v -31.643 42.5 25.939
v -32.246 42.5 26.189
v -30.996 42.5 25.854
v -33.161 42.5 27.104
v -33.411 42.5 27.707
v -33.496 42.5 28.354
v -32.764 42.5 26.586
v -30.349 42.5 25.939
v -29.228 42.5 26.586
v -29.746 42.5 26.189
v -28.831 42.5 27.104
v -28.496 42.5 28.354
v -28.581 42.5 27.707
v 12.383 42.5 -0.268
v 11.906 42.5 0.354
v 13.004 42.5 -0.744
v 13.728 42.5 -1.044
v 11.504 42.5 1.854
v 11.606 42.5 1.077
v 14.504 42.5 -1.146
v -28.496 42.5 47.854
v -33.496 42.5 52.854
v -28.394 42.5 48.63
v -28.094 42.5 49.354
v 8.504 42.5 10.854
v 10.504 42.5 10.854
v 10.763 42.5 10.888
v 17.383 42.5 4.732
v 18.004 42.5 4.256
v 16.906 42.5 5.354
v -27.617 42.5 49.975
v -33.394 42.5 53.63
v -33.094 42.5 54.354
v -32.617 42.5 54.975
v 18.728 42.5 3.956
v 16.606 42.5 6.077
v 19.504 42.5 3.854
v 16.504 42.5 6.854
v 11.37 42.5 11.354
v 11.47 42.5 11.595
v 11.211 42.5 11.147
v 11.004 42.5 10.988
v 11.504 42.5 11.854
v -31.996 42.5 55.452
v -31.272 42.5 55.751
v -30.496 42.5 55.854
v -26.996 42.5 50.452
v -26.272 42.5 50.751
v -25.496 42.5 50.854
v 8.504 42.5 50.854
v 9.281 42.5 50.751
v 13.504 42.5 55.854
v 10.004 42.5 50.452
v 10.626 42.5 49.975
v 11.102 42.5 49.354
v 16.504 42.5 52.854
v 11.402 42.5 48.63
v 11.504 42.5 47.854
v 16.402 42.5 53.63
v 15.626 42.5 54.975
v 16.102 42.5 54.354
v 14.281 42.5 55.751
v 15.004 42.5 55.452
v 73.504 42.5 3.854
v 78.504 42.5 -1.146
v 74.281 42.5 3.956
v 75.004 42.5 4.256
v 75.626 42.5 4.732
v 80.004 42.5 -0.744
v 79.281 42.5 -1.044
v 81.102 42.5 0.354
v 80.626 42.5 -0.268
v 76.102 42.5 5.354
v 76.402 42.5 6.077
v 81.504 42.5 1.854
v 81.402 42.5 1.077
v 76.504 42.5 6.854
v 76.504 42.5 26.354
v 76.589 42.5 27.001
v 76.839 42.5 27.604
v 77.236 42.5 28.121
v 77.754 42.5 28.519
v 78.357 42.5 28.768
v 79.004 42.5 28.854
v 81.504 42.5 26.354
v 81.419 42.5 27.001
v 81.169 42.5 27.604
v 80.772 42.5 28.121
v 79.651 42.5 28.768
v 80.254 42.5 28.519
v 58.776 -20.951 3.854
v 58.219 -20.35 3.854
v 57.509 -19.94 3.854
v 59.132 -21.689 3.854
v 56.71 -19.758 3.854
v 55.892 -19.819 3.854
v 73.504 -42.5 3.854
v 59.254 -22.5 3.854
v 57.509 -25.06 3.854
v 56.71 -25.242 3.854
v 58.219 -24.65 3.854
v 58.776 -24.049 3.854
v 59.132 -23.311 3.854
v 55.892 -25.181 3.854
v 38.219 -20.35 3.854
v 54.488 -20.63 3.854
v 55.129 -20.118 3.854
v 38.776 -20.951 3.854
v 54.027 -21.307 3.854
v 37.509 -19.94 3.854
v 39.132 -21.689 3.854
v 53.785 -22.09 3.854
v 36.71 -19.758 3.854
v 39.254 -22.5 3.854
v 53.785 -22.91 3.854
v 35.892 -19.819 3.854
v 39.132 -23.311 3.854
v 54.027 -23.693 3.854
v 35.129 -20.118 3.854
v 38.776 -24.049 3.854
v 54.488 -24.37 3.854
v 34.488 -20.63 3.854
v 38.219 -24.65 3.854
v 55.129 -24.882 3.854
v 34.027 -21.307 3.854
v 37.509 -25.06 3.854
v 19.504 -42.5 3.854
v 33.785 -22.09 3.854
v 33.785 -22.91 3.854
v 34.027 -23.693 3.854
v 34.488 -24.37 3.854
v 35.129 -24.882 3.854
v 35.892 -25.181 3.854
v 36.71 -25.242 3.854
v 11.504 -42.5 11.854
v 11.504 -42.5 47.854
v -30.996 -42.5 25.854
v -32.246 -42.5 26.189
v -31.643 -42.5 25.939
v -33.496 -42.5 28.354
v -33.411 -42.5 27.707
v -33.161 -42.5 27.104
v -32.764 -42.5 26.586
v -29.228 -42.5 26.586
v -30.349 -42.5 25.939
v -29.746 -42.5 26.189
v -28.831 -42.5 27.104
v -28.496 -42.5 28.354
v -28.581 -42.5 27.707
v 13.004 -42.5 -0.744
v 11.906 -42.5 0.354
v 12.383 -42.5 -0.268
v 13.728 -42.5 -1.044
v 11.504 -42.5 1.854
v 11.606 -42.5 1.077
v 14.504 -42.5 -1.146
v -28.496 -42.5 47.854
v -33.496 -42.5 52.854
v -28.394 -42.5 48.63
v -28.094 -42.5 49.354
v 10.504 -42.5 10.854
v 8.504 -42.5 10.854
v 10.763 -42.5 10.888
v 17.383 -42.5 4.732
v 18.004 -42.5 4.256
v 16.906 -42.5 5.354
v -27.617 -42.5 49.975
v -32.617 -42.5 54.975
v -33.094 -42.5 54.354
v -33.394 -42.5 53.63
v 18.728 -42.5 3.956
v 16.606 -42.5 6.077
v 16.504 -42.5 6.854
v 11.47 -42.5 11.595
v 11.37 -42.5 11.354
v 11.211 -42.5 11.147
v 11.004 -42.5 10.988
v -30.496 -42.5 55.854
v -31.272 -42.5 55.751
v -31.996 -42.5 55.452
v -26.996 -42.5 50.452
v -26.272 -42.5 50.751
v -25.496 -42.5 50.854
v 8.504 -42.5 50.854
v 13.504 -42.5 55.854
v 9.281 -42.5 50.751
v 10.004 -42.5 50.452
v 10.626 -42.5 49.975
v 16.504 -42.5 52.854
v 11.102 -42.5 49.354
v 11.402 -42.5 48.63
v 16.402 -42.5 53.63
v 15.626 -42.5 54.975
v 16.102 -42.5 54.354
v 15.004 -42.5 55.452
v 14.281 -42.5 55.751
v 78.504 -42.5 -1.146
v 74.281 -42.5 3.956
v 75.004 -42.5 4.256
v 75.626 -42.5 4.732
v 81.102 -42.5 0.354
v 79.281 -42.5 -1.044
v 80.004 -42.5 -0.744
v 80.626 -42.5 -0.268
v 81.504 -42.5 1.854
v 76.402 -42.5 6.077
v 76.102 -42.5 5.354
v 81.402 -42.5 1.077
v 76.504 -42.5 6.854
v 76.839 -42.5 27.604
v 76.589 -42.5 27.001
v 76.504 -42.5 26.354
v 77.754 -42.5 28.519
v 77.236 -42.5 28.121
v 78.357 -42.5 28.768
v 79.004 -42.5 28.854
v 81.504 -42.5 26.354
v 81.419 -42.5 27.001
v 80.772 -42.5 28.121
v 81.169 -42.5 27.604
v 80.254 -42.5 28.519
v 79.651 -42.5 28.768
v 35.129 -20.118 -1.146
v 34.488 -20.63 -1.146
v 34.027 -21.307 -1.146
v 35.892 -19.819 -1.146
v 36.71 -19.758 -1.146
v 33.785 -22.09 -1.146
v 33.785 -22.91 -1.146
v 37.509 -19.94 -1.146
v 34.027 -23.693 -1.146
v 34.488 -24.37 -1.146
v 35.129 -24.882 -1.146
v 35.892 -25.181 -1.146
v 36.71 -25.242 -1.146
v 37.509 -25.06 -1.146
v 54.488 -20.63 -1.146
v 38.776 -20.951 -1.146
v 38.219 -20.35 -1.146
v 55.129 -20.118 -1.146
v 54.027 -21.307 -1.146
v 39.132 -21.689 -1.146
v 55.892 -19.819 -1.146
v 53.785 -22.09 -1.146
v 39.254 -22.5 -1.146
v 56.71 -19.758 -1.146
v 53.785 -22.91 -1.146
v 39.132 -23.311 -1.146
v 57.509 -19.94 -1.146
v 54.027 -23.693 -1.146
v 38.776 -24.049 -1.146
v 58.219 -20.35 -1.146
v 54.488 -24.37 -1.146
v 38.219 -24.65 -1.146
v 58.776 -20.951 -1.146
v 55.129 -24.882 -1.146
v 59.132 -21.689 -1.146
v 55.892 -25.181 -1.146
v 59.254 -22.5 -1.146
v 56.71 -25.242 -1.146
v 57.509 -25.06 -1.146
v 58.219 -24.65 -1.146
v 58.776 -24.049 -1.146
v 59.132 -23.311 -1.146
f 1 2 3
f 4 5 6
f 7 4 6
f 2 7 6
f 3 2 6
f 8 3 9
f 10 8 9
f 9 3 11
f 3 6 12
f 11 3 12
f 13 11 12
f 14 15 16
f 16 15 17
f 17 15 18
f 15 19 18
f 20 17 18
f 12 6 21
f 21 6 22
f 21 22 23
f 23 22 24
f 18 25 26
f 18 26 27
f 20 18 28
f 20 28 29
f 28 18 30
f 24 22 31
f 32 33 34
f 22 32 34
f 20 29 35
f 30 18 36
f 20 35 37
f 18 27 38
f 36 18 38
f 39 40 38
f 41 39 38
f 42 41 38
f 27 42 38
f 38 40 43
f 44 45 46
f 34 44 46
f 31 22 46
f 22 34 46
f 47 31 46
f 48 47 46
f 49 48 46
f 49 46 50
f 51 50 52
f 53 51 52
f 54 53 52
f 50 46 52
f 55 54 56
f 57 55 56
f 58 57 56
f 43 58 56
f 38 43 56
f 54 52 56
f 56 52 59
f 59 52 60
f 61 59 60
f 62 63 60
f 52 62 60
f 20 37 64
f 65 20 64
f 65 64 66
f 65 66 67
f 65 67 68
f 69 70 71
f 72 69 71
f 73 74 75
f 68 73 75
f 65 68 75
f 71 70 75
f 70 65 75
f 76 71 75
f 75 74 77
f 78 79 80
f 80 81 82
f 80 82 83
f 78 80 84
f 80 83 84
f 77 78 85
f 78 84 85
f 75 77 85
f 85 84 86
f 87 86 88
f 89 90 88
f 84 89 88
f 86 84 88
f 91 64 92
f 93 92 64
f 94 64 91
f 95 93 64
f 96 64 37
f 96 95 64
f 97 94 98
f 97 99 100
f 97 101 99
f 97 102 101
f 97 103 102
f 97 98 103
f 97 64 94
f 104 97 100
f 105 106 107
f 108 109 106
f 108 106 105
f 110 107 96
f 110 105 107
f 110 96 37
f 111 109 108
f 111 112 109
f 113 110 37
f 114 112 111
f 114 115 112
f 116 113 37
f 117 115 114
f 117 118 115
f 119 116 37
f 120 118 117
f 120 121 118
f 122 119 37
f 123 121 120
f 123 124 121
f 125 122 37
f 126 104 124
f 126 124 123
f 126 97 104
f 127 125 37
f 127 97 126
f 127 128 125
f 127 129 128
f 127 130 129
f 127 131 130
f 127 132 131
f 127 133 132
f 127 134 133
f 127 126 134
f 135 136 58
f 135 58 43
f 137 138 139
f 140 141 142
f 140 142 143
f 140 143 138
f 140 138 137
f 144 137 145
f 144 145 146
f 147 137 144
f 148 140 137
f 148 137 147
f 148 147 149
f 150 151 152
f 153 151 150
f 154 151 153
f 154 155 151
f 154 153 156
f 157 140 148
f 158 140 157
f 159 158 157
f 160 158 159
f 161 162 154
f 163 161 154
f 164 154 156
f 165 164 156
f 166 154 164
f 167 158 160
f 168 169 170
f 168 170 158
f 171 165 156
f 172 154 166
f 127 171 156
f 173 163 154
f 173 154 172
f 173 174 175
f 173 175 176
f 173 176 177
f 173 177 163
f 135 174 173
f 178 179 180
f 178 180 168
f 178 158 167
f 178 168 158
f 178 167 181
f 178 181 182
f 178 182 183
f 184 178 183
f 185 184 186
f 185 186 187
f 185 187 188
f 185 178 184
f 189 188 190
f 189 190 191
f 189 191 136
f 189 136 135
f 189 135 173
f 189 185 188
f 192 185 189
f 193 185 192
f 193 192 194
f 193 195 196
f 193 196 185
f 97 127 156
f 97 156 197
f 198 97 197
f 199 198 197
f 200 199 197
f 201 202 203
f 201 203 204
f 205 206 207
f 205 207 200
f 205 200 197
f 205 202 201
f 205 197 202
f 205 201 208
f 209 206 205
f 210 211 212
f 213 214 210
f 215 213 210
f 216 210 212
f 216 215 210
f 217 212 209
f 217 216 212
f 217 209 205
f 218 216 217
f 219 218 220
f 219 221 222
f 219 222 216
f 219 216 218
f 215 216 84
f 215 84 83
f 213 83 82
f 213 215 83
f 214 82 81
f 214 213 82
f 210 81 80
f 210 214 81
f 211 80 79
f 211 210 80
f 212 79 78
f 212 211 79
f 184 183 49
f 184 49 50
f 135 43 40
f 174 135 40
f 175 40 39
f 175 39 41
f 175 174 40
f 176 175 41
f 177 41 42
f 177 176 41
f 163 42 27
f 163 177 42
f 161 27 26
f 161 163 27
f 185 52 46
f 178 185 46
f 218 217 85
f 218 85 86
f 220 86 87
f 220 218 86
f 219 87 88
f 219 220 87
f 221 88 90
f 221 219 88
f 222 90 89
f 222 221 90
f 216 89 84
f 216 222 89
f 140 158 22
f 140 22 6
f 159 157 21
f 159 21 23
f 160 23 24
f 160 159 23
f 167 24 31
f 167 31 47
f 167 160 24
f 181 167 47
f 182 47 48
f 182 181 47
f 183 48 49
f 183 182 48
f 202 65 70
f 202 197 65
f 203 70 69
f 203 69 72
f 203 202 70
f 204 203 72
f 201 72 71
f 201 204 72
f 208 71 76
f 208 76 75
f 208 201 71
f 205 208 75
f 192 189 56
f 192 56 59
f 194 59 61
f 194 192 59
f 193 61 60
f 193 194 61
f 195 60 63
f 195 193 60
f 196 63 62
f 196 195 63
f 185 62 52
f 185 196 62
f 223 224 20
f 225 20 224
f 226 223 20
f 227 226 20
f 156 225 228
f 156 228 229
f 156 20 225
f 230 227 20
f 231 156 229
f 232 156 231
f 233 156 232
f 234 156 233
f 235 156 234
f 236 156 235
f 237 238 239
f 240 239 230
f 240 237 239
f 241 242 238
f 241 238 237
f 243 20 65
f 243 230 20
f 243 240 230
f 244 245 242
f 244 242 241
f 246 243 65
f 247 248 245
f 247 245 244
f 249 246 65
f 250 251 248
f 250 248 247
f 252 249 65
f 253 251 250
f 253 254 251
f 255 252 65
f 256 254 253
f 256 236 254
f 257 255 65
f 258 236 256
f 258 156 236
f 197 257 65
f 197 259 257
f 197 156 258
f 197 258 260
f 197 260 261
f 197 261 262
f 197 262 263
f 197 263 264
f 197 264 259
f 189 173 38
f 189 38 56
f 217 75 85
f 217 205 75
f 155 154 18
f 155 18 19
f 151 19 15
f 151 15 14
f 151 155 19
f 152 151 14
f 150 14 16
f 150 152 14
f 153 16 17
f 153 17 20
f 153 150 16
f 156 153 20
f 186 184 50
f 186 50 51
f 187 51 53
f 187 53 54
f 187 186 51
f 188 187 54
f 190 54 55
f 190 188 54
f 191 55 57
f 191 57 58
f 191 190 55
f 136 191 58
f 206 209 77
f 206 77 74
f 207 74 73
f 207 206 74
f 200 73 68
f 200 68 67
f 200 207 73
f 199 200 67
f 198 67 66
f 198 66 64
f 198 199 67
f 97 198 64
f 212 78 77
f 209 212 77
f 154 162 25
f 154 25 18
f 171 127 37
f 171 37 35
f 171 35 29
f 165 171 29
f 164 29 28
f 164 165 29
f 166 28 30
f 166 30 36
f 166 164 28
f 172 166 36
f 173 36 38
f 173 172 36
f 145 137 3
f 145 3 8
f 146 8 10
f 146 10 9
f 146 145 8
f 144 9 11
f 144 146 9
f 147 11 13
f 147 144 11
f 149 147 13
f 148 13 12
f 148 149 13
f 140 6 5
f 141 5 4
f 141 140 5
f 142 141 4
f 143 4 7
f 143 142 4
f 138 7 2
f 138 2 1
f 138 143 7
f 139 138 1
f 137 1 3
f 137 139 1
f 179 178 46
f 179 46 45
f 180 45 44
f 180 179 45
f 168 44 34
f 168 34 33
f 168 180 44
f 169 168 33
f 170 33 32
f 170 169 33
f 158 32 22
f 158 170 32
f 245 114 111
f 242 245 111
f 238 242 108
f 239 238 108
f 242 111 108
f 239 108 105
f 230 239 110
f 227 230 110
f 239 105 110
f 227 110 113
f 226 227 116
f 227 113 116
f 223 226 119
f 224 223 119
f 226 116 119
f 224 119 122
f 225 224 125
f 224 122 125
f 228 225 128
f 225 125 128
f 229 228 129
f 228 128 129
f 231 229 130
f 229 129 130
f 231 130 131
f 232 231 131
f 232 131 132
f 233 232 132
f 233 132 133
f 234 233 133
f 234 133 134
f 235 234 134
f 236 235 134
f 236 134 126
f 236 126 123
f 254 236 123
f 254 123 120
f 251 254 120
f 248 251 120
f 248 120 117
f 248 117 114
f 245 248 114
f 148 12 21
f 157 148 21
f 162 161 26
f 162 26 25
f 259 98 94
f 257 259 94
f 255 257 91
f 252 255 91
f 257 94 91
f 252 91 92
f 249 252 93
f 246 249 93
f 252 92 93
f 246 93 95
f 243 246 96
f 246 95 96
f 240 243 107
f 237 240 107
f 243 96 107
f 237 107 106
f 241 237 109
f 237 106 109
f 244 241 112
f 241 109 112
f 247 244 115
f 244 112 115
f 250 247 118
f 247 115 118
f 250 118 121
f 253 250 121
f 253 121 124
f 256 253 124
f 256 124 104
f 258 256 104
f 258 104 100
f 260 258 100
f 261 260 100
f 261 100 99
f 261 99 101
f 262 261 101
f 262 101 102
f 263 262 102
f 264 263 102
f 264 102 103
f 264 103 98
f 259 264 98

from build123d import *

# Parameters (mm, degrees)
F1_DEPTH = 42.5
F2_R     = 2.75
F3_DEPTH = 5.001


with BuildPart() as f1:
    # F0 (on Front) → F1 (new body, symmetric)
    with BuildSketch(Plane.XZ):
        with BuildLine():
            Line((81.504221, 1.853635), (81.504221, 26.353635))
            ThreePointArc((81.504221, 26.353635), (80.771988, 28.121402), (79.004221, 28.853635))
            ThreePointArc((79.004221, 28.853635), (77.236454, 28.121402), (76.504221, 26.353635))
            Line((76.504221, 26.353635), (76.504221, 6.853635))
            ThreePointArc((76.504221, 6.853635), (75.625541, 4.732315), (73.504221, 3.853635))
            Line((73.504221, 3.853635), (19.504221, 3.853635))
            ThreePointArc((19.504221, 3.853635), (17.382901, 4.732315), (16.504221, 6.853635))
            Line((16.504221, 6.853635), (16.504221, 52.853635))
            ThreePointArc((16.504221, 52.853635), (15.625541, 54.974956), (13.504221, 55.853635))
            Line((13.504221, 55.853635), (-30.495779, 55.853635))
            ThreePointArc((-30.495779, 55.853635), (-32.617099, 54.974956), (-33.495779, 52.853635))
            Line((-33.495779, 52.853635), (-33.495779, 28.353635))
            ThreePointArc((-33.495779, 28.353635), (-32.763546, 26.585868), (-30.995779, 25.853635))
            ThreePointArc((-30.995779, 25.853635), (-29.228012, 26.585868), (-28.495779, 28.353635))
            Line((-28.495779, 28.353635), (-28.495779, 47.853635))
            ThreePointArc((-28.495779, 47.853635), (-27.617099, 49.974956), (-25.495779, 50.853635))
            Line((-25.495779, 50.853635), (8.504221, 50.853635))
            ThreePointArc((8.504221, 50.853635), (10.625541, 49.974956), (11.504221, 47.853635))
            Line((11.504221, 47.853635), (11.504221, 11.853635))
            ThreePointArc((11.504221, 11.853635), (11.211328, 11.146529), (10.504221, 10.853635))
            Line((10.504221, 10.853635), (8.504221, 10.853635))
            Line((8.504221, 10.853635), (11.504221, 1.853635))
            ThreePointArc((11.504221, 1.853635), (12.382901, -0.267685), (14.504221, -1.146365))
            Line((14.504221, -1.146365), (78.504221, -1.146365))
            ThreePointArc((78.504221, -1.146365), (80.625541, -0.267685), (81.504221, 1.853635))
        make_face()
    extrude(amount=F1_DEPTH, both=True)

    # F2 (on face) → F3 (cut, through all)
    with BuildSketch(Plane.XY.offset(3.853635)):
        with Locations((36.504221, -22.5)):
            Circle(F2_R)
        with Locations((56.504221, -22.5)):
            Circle(F2_R)
    extrude(amount=-F3_DEPTH, mode=Mode.SUBTRACT)


solid = f1.part
